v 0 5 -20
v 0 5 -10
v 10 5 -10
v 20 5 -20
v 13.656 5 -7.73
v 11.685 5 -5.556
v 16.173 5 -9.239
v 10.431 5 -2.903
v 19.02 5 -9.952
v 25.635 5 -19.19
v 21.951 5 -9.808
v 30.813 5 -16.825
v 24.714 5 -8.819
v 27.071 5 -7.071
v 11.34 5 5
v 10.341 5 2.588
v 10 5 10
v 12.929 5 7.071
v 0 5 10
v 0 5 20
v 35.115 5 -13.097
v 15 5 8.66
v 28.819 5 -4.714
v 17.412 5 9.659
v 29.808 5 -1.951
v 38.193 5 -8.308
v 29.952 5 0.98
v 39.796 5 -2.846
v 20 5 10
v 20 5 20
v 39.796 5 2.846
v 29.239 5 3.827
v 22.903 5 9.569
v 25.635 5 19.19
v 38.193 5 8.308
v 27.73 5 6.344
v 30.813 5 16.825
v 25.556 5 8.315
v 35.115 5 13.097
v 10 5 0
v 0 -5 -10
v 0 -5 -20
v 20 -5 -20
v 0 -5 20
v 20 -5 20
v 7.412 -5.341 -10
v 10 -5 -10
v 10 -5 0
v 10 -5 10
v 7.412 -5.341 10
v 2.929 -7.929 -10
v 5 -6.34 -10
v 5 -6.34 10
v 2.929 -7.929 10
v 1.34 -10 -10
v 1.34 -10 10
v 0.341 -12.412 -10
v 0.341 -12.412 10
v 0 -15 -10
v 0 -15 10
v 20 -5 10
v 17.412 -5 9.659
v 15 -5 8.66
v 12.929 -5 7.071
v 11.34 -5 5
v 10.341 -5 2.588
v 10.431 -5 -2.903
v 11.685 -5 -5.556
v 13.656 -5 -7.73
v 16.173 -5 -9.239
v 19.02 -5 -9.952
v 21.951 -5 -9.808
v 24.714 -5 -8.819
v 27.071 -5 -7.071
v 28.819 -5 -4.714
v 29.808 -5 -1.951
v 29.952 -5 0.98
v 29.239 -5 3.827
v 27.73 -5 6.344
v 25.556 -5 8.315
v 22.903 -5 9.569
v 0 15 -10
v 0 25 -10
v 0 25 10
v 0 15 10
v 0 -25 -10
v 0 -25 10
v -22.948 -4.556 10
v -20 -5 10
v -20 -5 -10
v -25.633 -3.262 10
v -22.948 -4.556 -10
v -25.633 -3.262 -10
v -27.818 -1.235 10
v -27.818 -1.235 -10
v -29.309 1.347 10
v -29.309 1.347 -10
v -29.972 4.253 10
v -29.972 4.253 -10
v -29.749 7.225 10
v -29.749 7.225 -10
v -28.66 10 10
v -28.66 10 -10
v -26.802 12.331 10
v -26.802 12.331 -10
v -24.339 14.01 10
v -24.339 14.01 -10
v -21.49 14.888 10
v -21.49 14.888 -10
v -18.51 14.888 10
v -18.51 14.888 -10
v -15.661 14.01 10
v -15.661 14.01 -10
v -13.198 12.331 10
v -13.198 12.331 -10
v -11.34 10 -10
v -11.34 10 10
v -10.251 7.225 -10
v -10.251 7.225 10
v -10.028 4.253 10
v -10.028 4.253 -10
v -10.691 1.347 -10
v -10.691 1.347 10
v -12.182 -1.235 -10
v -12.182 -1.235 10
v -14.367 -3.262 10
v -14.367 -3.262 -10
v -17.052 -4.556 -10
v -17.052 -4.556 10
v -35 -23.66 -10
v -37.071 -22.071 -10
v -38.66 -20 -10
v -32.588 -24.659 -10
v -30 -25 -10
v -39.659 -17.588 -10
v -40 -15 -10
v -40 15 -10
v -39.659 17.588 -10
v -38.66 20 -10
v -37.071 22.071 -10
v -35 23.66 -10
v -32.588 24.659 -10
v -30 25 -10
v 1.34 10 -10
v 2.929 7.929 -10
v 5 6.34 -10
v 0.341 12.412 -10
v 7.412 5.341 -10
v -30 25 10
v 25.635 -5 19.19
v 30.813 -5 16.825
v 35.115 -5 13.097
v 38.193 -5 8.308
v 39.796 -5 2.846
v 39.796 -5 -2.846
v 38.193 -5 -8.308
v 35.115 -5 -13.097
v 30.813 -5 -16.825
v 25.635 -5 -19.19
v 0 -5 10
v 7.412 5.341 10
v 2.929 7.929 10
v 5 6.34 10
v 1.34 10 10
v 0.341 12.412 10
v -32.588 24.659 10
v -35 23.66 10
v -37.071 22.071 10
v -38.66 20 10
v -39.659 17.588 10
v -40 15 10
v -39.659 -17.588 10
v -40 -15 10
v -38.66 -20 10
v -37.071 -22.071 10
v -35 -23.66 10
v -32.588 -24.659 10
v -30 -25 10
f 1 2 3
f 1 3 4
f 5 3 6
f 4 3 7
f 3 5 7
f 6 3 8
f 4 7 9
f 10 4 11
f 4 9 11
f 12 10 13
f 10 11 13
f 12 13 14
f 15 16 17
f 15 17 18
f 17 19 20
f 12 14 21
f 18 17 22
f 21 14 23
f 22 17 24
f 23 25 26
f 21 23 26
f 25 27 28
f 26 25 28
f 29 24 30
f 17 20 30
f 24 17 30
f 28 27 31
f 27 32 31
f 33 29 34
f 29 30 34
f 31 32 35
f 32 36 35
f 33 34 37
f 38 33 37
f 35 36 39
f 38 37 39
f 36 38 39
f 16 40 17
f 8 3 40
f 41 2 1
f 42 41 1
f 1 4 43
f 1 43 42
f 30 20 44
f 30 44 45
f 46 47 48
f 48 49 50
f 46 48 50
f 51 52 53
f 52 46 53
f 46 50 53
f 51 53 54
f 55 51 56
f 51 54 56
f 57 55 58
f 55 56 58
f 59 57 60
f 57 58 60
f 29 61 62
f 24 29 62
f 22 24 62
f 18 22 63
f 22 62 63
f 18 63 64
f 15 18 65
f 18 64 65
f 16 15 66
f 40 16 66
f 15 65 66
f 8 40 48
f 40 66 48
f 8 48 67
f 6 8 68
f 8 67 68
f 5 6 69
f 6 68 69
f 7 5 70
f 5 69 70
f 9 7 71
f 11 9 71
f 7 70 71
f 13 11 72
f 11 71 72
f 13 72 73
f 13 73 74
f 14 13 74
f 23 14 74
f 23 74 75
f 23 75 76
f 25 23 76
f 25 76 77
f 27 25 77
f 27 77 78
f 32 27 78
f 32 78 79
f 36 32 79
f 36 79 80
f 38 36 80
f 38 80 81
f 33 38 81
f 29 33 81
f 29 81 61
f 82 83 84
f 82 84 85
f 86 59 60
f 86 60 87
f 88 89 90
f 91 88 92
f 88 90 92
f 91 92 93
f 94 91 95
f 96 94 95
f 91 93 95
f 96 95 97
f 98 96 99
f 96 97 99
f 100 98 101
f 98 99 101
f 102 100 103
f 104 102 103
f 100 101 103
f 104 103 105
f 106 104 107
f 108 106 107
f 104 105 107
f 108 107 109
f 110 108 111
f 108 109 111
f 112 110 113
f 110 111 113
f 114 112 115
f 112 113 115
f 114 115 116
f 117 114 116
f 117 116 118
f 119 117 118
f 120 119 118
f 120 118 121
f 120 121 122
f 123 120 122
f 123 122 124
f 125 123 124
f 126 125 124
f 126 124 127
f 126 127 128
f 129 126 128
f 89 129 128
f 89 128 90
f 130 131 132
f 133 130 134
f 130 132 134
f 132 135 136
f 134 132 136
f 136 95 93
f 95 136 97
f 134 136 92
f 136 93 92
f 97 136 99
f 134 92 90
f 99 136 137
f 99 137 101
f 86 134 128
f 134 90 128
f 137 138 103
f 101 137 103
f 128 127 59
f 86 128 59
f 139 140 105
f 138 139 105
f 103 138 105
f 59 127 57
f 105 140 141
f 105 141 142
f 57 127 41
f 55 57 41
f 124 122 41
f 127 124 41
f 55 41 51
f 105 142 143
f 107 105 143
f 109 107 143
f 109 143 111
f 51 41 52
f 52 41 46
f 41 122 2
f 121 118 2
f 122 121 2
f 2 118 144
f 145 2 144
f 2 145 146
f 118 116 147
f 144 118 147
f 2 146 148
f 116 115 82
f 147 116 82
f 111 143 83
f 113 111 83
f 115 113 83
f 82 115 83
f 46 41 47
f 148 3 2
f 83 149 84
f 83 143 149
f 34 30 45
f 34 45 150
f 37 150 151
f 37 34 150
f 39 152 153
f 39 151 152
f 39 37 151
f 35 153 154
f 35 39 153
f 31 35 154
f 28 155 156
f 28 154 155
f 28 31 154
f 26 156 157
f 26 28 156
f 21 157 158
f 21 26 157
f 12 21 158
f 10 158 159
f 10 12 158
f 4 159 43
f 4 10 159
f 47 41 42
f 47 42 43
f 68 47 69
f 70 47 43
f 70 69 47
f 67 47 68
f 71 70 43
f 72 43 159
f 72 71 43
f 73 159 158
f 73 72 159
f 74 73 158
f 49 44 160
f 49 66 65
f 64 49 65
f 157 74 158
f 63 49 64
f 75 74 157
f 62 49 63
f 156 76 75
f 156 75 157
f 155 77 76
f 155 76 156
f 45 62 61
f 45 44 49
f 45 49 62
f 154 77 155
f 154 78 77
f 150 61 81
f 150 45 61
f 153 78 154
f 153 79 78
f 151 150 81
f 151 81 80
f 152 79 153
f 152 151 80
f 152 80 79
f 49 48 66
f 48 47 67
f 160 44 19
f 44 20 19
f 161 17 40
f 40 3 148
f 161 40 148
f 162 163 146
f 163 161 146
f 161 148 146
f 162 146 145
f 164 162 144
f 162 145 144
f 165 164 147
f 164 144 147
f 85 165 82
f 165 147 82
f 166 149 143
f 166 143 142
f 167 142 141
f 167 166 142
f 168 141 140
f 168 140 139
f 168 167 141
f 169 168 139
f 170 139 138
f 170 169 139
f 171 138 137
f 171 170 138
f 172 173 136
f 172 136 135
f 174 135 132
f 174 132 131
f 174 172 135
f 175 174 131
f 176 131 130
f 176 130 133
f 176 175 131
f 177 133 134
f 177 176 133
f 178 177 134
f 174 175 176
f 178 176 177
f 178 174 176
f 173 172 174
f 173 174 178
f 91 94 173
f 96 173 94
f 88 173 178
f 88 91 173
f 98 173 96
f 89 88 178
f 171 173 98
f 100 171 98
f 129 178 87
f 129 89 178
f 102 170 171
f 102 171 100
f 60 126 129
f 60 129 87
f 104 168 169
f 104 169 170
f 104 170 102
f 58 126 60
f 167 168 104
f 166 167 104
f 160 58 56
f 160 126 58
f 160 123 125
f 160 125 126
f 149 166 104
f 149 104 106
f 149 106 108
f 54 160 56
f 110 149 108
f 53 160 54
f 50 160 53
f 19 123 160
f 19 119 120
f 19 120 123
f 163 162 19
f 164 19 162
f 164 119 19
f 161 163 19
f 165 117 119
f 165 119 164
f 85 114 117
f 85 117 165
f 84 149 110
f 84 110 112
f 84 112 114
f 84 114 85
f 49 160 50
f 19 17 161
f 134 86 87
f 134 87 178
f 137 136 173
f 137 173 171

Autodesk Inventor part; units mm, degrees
ref_plane "YZ Plane" through (0, 0, 0) normal (1, 0, 0) x (0, 1, 0)
ref_plane "XZ Plane" through (0, 0, 0) normal (0, 1, 0) x (-1, 0, 0)
sketch "草圖1" plane through (0, 0, 0) normal (0, 0, 1) x (1, 0, 0)
  line L0 (-40, 25) -> (0, 25)
  line L1 (0, 25) -> (0, -25)
  line L2 (0, -25) -> (-40, -25)
  line L3 (-40, -25) -> (-40, 25)
  point P0 (0, 0)
  point P1 (0, 0)
  dimension "d0" = 50
  dimension "d1" = 40
extrude "擠出1" add sketch "草圖1" along normal mid plane 20
fillet "圓角1" radius 10 2 edges at (-40, 25, 0) (-40, -25, 0)
sketch "草圖2" plane through (0, 0, 10) normal (0, 0, 1) x (1, 0, 0)
  arc A0 (-40, -15) -> (-30, -25) centre (-30, -15) ccw projected
  line L0 (-40, -15) -> (-40, 15) projected
  arc A1 (-30, 25) -> (-40, 15) centre (-30, 15) ccw projected
  line L1 (-30, 25) -> (0, 25) projected
  line L2 (0, 25) -> (0, -25) projected
  line L3 (0, -25) -> (-30, -25) projected
  point P0 (0, 0)
  point P1 (-20, 5)
  dimension "d5" = 20
  dimension "d6" = 20
hole "孔1" at (-20, 5, 10) direction (0, 0, -1) diameter 20 end through all
ref_plane "工作平面1" through (0, 0, -10) normal (0, -1, 0) x (1, 0, 0)
sketch "草圖3" plane through (0, 0, -10) normal (0, -1, 0) x (1, 0, 0)
  line L0 (-11.3397, 0) -> (-11.3397, 20) projected
  line L1 (-11.3397, 20) -> (0, 20) projected
  line L2 (0, 20) -> (0, 0) projected
  line L3 (0, 0) -> (-11.3397, 0) projected
  line L4 (-28.6603, 20) -> (-28.6603, 0) projected
  line L5 (-28.6603, 0) -> (-40, 0) projected
  line L6 (-40, 0) -> (-40, 20) projected
  line L7 (-40, 20) -> (-28.6603, 20) projected
  circle A0 centre (20, 10) radius 20
  line L8 (20, -10) -> (0, -10)
  line L9 (0, -10) -> (0, 30)
  line L10 (0, 30) -> (20, 30)
  line L11 (20, 30) -> (20, -10)
  point P0 (0, 10)
  point P1 (0, 10)
  point P2 (20, 10)
  point P3 (0, 20)
  dimension "d15" = 40
  dimension "d14" = 20
extrude "擠出2" add sketch "草圖3" along normal mid plane 10 contours L2 A0 L8 L9 | L9 L10 A0 L2 | A0 L11 | A0 L11
fillet "圓角2" radius 10 2 edges at (0, 5, 0) (0, -5, 0)
sketch "草圖4" plane through (0, 5, -10) normal (0, 1, 0) x (1, 0, 0)
  arc A0 (20, -30) -> (20, 10) centre (20, -10) ccw projected
  point P0 (0, -10)
hole "孔2" at (20, 5, 0) direction (0, -1, 0) diameter 20 end through all
properties part number "22" material "鋼、碳鋼"
